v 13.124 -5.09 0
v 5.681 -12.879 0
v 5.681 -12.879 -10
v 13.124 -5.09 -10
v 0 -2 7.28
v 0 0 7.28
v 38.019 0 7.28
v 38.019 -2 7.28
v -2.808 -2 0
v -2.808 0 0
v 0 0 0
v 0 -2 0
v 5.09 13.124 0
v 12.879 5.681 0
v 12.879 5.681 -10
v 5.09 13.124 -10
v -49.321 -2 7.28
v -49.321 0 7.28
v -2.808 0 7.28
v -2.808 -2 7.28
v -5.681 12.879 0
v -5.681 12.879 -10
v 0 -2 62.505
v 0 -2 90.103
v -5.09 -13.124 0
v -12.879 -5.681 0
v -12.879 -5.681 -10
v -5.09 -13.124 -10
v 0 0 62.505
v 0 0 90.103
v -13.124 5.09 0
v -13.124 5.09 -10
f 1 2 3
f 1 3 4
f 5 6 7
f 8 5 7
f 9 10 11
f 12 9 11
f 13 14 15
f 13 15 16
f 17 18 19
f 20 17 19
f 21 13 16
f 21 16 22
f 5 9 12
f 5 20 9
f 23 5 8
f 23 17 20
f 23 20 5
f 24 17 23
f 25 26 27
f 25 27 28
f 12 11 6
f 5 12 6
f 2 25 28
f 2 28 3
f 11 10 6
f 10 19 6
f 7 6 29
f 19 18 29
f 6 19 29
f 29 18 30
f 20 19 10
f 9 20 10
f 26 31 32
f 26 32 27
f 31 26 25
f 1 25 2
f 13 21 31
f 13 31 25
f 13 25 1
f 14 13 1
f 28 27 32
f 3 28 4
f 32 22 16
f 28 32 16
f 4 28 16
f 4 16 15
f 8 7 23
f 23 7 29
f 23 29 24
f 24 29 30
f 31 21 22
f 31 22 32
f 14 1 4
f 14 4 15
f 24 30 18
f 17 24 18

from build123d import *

# Parameters (mm, degrees)
F1_DEPTH = 10
F3_DEPTH = 2


with BuildPart() as f1:
    # F0 (on Top) → F1 (new body)
    with BuildSketch(Plane.XY):
        Polygon((-5.680988, 12.879334), (-13.124129, 5.089999), (-12.879334, -5.680988), (-5.089999, -13.124129), (5.680988, -12.879334), (13.124129, -5.089999), (12.879334, 5.680988), (5.089999, 13.124129), align=None)
    extrude(amount=-F1_DEPTH)


with BuildPart() as f3:
    # F2 (on Front) → F3 (new body)
    with BuildSketch(Plane.XZ):
        Polygon((-2.808472, 0), (0, 0), (0, 7.280002), (0, 14.560004), (20.74383, 14.560004), (0, 42.571541), (0, 55.319596), (-31.359844, 14.560004), (-5.616945, 14.560004), (-2.808472, 7.280002), align=None)
        Polygon((0, 14.560004), (0, 7.280002), (38.019471, 7.280002), (0, 62.504523), (0, 90.102866), (-49.321156, 7.280002), (-2.808472, 7.280002), (-5.616945, 14.560004), (-31.359844, 14.560004), (0, 55.319596), (0, 42.571541), (20.74383, 14.560004), align=None)
    extrude(amount=F3_DEPTH)


solid = Compound([f1.part, f3.part])
